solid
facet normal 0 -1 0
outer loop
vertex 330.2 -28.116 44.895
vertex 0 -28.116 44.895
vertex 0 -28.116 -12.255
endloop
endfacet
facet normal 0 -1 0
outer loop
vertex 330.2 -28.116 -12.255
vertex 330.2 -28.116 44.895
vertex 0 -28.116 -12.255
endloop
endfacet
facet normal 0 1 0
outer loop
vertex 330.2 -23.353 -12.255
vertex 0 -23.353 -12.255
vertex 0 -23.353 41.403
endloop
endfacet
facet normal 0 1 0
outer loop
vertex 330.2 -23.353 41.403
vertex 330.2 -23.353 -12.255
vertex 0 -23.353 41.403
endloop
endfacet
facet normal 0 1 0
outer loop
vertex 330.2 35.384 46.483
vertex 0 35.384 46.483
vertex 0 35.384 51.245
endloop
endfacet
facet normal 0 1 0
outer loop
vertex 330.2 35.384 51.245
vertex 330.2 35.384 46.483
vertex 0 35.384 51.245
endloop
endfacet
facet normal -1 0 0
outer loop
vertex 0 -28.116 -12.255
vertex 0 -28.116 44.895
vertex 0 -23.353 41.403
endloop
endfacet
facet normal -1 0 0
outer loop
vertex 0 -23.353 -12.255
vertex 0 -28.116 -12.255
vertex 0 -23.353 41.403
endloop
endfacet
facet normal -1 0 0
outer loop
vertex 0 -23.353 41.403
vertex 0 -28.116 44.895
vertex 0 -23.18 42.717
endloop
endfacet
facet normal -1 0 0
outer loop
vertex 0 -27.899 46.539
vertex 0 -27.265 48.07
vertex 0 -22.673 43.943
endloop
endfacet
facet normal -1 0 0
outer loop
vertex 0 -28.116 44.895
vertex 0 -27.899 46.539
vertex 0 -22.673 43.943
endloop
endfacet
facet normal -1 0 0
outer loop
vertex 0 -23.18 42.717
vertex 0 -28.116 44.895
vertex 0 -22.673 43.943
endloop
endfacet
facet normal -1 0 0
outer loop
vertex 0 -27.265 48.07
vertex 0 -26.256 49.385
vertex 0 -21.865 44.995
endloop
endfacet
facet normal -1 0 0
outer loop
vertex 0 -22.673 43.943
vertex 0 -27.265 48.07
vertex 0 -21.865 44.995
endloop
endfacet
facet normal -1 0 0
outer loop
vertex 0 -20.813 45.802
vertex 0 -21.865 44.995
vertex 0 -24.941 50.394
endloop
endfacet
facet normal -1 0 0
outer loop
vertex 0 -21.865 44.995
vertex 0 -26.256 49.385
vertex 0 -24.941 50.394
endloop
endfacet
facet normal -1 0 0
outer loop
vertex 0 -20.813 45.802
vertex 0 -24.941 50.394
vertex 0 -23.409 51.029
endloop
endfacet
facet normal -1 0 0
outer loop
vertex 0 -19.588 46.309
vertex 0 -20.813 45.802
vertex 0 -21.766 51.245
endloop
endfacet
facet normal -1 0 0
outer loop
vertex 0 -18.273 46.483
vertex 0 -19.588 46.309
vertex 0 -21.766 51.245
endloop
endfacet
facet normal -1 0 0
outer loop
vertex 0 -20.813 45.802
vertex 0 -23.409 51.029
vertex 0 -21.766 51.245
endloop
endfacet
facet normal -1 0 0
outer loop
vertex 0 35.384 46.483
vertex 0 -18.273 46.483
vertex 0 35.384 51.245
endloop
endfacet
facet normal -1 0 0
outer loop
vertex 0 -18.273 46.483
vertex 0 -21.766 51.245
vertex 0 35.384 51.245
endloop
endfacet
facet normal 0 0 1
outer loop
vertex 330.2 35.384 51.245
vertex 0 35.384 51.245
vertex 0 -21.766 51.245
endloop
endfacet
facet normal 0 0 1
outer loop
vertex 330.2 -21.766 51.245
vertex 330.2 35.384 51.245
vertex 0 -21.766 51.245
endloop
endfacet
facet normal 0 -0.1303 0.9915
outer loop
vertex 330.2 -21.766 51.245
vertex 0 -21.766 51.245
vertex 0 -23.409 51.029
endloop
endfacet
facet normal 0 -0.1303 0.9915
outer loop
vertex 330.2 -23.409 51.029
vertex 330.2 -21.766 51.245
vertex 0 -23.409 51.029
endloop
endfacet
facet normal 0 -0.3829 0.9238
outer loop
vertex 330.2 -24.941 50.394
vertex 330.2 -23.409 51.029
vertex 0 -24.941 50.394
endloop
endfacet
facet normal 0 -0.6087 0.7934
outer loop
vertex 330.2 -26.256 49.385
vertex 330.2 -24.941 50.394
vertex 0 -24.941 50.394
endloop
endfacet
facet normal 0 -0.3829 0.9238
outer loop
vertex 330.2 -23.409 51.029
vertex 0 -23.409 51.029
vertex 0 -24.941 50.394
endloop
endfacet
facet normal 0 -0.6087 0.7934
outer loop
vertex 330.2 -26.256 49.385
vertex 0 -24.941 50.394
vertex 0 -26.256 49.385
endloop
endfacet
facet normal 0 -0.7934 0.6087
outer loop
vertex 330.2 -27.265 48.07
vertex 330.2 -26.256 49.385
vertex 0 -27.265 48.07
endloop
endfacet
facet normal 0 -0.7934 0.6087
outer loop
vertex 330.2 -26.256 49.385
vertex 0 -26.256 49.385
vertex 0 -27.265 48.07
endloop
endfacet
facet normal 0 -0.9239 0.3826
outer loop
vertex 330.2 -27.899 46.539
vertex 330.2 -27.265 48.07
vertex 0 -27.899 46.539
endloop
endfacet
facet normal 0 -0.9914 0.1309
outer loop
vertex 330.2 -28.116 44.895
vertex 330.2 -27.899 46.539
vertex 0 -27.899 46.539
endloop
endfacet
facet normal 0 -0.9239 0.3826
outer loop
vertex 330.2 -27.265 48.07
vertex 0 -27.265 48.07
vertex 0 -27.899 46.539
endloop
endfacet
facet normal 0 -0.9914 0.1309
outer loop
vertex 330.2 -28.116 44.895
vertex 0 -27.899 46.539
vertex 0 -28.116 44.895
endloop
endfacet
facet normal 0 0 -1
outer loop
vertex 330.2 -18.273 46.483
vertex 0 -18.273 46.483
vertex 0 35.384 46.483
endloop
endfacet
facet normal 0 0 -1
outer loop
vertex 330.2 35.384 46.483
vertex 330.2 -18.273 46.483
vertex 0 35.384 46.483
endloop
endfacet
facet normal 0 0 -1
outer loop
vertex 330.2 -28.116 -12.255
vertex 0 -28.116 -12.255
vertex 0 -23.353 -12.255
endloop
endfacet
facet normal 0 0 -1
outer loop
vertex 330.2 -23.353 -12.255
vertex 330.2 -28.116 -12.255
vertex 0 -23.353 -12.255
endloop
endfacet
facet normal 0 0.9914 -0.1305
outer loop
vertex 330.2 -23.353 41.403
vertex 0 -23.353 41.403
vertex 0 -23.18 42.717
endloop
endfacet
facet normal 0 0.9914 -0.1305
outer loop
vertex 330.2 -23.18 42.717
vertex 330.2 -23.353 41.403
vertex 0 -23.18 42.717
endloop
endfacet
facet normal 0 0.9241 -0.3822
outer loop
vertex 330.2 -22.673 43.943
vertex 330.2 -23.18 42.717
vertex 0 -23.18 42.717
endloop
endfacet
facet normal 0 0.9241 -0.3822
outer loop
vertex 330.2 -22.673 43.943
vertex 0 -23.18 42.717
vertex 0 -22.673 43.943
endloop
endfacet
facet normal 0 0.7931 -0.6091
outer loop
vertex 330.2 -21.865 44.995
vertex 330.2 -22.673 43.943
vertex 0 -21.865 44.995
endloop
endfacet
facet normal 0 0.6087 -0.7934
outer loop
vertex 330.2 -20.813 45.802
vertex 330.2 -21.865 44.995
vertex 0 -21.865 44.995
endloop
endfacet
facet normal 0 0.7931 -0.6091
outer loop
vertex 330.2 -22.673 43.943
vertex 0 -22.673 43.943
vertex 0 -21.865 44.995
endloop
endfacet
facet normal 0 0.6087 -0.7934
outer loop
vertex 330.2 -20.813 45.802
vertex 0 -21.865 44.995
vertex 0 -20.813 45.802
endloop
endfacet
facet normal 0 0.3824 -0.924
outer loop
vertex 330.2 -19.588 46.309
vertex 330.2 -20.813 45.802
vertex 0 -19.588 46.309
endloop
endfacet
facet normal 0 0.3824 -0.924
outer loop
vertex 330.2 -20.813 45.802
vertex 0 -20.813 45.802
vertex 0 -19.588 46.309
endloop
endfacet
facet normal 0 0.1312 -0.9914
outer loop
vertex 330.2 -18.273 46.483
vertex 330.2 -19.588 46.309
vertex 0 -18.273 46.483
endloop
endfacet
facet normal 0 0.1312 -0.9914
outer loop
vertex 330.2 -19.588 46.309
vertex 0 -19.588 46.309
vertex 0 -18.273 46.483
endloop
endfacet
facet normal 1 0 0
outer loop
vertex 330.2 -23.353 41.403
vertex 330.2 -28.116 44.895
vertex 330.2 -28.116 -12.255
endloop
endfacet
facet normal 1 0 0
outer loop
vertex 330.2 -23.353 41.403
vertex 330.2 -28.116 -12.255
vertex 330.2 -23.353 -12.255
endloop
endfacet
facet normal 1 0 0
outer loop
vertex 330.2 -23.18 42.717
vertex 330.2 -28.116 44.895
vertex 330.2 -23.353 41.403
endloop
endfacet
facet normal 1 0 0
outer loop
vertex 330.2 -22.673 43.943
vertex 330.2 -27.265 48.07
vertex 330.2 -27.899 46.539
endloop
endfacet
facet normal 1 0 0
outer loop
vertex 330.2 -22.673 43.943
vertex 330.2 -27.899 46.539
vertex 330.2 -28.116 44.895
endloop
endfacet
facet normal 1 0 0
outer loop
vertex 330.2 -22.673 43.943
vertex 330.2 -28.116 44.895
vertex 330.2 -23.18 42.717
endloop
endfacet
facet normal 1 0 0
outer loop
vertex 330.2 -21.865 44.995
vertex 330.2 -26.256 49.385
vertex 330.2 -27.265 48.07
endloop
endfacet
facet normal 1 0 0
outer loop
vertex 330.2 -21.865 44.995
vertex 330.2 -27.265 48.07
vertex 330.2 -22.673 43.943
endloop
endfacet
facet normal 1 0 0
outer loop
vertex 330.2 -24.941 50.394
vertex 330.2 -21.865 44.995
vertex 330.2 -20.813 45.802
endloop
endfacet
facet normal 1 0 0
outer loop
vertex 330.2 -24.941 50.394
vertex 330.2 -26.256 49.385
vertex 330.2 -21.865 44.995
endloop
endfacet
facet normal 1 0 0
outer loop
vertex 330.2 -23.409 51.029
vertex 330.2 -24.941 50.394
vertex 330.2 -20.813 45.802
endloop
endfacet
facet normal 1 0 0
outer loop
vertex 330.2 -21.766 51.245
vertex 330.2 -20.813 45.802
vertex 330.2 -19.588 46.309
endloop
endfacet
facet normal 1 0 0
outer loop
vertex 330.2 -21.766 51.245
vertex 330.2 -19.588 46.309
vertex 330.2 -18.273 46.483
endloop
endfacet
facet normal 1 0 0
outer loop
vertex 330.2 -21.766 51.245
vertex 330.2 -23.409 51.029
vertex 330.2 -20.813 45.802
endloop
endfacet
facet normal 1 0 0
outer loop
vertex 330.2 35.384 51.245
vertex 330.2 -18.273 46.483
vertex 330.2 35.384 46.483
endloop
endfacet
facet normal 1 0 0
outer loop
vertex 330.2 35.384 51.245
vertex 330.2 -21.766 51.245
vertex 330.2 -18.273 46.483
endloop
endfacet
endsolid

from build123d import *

# Parameters (mm, degrees)
F1_DEPTH = 330.2


with BuildPart() as f1:
    # F0 (on Right) → F1 (new body)
    with BuildSketch(Plane.YZ):
        with BuildLine():
            Line((-28.115756, 44.895094), (-28.115756, -12.254906))
            Line((-28.115756, -12.254906), (-23.353256, -12.254906))
            Line((-23.353256, -12.254906), (-23.353256, 41.402594))
            ThreePointArc((-23.353256, 41.402594), (-21.865359, 44.994697), (-18.273256, 46.482594))
            Line((-18.273256, 46.482594), (35.384244, 46.482594))
            Line((35.384244, 46.482594), (35.384244, 51.245094))
            Line((35.384244, 51.245094), (-21.765756, 51.245094))
            ThreePointArc((-21.765756, 51.245094), (-26.255884, 49.385222), (-28.115756, 44.895094))
        make_face()
    extrude(amount=F1_DEPTH)


solid = f1.part
